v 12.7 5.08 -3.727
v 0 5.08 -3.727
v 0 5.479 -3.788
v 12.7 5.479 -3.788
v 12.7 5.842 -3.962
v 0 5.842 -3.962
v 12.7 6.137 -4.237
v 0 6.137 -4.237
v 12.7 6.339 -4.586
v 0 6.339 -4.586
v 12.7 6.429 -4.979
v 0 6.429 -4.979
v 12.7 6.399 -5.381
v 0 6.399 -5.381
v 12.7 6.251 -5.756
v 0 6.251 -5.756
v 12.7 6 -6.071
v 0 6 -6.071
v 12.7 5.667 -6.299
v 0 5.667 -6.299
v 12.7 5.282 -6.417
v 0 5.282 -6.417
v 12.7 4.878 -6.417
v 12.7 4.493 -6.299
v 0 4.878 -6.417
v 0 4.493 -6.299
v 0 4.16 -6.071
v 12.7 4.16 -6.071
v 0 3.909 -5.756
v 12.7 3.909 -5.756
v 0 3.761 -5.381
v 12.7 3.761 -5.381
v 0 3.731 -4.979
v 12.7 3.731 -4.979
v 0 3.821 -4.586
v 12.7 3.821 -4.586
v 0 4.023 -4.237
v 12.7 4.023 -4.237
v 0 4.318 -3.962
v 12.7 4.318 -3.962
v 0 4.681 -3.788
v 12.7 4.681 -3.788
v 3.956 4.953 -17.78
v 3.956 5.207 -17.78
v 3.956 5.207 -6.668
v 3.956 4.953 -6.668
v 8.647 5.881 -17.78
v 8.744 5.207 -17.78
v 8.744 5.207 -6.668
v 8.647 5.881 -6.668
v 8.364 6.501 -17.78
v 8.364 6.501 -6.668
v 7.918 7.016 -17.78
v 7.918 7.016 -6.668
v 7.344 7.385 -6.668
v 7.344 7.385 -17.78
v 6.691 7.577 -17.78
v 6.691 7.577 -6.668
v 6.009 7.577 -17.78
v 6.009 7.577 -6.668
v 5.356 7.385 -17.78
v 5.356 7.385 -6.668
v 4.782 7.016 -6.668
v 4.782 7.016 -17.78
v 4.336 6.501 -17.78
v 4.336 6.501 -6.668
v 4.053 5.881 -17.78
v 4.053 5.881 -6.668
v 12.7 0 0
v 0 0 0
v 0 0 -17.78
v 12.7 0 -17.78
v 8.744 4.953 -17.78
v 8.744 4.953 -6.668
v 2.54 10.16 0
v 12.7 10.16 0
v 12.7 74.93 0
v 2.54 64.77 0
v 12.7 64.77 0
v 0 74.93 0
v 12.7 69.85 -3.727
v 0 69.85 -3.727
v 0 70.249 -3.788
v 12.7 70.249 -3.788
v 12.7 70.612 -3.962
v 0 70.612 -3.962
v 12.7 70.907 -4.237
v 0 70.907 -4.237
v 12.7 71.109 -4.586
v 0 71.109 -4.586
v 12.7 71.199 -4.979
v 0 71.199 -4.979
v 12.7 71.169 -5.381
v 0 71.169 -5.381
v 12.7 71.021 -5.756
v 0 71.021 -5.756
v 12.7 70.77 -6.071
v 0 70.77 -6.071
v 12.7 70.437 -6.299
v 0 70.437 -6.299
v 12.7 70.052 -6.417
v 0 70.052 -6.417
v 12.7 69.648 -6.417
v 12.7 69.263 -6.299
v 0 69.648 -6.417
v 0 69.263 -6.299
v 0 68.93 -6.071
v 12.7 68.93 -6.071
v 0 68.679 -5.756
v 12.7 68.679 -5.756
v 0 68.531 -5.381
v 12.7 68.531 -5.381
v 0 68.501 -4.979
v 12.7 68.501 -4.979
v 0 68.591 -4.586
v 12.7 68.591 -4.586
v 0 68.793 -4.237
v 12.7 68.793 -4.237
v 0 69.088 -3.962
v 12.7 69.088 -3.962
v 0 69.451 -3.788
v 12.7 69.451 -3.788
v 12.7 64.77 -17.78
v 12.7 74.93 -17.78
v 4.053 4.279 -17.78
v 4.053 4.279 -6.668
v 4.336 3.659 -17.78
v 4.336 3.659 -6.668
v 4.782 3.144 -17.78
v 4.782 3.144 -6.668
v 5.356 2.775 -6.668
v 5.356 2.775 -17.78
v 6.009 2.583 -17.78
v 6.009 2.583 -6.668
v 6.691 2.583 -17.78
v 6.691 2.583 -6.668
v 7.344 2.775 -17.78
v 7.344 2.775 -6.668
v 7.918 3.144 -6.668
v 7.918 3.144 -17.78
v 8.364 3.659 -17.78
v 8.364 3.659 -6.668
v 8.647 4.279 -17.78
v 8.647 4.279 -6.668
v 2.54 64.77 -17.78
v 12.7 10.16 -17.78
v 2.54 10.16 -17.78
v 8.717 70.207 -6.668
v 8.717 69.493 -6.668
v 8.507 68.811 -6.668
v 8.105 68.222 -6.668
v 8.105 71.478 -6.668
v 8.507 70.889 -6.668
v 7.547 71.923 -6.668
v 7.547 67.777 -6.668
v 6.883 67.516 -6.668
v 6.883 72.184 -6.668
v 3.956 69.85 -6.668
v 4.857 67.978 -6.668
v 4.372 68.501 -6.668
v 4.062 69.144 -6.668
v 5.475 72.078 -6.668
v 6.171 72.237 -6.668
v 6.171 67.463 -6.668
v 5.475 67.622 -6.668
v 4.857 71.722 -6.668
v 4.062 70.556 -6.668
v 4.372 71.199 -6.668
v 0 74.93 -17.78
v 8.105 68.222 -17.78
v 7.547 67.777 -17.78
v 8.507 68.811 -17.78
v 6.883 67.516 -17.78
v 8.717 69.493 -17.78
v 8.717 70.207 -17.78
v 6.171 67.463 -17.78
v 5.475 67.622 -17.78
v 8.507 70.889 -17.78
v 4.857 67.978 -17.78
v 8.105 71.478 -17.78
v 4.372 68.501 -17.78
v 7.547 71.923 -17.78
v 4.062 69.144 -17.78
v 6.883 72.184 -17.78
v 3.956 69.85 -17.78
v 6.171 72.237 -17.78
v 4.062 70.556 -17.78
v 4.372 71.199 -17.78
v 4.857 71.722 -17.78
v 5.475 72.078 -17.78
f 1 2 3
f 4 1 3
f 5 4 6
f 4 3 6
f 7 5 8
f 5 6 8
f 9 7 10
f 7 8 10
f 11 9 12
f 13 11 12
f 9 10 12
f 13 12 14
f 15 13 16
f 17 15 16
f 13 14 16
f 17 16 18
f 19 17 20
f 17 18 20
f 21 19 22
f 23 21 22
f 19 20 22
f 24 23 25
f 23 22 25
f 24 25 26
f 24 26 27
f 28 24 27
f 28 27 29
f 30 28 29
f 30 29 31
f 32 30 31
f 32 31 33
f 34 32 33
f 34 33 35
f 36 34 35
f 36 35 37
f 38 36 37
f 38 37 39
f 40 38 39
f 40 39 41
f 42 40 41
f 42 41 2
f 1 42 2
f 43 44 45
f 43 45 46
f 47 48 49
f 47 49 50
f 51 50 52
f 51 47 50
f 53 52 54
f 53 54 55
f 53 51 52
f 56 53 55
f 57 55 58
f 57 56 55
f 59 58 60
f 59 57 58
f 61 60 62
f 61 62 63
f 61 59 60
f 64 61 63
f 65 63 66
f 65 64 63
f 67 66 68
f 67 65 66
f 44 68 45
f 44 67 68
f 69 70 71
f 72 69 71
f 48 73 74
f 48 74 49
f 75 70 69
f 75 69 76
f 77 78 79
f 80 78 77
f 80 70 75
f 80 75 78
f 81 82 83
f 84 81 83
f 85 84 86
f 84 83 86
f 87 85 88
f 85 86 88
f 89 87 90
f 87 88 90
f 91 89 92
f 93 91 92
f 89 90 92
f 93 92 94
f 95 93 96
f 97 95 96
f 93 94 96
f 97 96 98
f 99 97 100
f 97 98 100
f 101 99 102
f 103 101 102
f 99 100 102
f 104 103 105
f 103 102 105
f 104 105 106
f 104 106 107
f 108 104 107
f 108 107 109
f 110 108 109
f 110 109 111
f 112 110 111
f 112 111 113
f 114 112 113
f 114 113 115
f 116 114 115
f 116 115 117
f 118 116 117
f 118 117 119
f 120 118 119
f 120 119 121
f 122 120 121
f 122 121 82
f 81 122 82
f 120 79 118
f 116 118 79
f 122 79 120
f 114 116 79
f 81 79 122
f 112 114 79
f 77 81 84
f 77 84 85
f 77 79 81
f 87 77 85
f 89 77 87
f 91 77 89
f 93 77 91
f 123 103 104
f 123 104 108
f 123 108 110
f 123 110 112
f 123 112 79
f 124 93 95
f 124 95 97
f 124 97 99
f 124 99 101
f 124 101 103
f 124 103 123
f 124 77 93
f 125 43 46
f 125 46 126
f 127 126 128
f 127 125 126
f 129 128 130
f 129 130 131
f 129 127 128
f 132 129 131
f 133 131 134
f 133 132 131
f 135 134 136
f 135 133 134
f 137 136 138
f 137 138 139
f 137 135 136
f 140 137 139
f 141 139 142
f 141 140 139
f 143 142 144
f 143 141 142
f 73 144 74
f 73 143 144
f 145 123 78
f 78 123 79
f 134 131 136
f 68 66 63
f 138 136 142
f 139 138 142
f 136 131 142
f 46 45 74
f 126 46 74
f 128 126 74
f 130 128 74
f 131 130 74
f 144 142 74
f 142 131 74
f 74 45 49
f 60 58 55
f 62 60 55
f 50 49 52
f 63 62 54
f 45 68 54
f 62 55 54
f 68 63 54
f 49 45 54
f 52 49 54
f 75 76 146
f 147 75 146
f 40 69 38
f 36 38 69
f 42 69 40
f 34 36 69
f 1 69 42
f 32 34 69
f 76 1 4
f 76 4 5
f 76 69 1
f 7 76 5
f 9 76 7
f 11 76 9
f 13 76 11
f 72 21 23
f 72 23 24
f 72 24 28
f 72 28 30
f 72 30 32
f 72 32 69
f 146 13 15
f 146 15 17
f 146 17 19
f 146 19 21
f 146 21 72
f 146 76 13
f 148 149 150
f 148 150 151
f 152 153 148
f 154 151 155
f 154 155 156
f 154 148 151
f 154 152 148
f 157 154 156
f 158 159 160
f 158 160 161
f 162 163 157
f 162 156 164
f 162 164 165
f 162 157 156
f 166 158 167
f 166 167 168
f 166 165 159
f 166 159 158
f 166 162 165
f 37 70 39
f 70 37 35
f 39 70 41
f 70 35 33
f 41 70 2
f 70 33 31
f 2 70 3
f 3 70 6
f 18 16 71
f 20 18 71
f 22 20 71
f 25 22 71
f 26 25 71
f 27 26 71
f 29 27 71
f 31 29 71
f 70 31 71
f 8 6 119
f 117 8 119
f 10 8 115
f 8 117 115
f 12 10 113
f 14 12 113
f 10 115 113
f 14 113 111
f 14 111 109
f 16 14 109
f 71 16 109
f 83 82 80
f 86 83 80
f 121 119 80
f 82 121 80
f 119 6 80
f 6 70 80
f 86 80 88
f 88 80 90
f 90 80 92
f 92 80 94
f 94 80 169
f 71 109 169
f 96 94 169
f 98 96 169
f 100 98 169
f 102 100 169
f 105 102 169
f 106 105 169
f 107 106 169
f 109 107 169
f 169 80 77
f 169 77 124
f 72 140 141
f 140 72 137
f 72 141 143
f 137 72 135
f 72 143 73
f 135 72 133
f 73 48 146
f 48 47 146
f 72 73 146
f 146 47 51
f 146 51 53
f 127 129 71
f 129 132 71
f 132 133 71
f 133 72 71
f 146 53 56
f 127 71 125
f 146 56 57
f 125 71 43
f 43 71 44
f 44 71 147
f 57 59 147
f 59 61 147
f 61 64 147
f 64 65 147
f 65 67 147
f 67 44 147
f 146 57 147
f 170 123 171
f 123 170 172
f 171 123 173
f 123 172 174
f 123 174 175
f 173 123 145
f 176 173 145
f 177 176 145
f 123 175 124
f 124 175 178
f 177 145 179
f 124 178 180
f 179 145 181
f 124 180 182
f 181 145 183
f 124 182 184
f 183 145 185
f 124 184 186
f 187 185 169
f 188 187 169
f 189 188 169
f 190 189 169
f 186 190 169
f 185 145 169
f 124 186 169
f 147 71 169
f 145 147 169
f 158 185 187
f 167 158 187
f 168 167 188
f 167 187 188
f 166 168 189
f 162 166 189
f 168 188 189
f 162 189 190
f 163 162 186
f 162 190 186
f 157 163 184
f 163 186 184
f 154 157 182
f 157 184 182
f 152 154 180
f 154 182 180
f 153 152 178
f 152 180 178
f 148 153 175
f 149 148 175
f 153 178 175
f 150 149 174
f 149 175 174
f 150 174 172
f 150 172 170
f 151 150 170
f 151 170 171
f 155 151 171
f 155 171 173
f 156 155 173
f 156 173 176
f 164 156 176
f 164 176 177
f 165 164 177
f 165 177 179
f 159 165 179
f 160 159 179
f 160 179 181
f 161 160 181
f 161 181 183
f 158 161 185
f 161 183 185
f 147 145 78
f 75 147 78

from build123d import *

# Parameters (mm, degrees)
SKETCH1_W                 = 17.78
SKETCH1_H                 = 74.93
BOSS_EXTRUDE1_DEPTH       = 12.7
CUT_EXTRUDE1_DEPTH        = 10.16
TAP_DRILL_FOR_6_32_TAP1_D = 2.7051
SKETCH5_R                 = 2.39395
CUT_EXTRUDE2_DEPTH        = 11.1125


with BuildPart() as part:
    # Sketch1 → Boss-Extrude1 (new body)
    with BuildSketch(Plane(origin=(0, 0, 0), x_dir=(0, 0, -1), z_dir=(1, 0, 0))):
        with Locations((8.89, 37.465)):
            Rectangle(SKETCH1_W, SKETCH1_H)
    extrude(amount=BOSS_EXTRUDE1_DEPTH)

    # Sketch2 → Cut-Extrude1 (cut)
    with BuildSketch(Plane(origin=(12.7, 0, 0), x_dir=(0, 0, -1), z_dir=(1, 0, 0))):
        Polygon((0, 64.77), (10.16, 64.77), (13.97, 64.77), (24.13, 64.77), (24.13, 10.16), (13.97, 10.16), (10.16, 10.16), (0, 10.16), align=None)
    extrude(amount=-CUT_EXTRUDE1_DEPTH, mode=Mode.SUBTRACT)

    # Tap Drill for #6-32 Tap1 (through all)
    with Locations(Plane(origin=(12.7, 0, 0), x_dir=(0, 0, -1), z_dir=(1, 0, 0))):
        with Locations((5.08, 69.85), (5.08, 5.08)):
            Hole(TAP_DRILL_FOR_6_32_TAP1_D / 2)

    # Sketch5 → Cut-Extrude2 (cut)
    with BuildSketch(Plane(origin=(0, 0, -17.78), x_dir=(-1, 0, 0), z_dir=(0, 0, -1))):
        with Locations((-6.35, 69.85)):
            Circle(SKETCH5_R)
        with BuildLine():
            Line((-8.74395, 4.953), (-8.74395, 5.207))
            ThreePointArc((-8.74395, 5.207), (-6.35, 7.60095), (-3.95605, 5.207))
            Line((-3.95605, 5.207), (-3.95605, 4.953))
            ThreePointArc((-3.95605, 4.953), (-6.35, 2.55905), (-8.74395, 4.953))
        make_face()
    extrude(amount=-CUT_EXTRUDE2_DEPTH, mode=Mode.SUBTRACT)


solid = part.part
